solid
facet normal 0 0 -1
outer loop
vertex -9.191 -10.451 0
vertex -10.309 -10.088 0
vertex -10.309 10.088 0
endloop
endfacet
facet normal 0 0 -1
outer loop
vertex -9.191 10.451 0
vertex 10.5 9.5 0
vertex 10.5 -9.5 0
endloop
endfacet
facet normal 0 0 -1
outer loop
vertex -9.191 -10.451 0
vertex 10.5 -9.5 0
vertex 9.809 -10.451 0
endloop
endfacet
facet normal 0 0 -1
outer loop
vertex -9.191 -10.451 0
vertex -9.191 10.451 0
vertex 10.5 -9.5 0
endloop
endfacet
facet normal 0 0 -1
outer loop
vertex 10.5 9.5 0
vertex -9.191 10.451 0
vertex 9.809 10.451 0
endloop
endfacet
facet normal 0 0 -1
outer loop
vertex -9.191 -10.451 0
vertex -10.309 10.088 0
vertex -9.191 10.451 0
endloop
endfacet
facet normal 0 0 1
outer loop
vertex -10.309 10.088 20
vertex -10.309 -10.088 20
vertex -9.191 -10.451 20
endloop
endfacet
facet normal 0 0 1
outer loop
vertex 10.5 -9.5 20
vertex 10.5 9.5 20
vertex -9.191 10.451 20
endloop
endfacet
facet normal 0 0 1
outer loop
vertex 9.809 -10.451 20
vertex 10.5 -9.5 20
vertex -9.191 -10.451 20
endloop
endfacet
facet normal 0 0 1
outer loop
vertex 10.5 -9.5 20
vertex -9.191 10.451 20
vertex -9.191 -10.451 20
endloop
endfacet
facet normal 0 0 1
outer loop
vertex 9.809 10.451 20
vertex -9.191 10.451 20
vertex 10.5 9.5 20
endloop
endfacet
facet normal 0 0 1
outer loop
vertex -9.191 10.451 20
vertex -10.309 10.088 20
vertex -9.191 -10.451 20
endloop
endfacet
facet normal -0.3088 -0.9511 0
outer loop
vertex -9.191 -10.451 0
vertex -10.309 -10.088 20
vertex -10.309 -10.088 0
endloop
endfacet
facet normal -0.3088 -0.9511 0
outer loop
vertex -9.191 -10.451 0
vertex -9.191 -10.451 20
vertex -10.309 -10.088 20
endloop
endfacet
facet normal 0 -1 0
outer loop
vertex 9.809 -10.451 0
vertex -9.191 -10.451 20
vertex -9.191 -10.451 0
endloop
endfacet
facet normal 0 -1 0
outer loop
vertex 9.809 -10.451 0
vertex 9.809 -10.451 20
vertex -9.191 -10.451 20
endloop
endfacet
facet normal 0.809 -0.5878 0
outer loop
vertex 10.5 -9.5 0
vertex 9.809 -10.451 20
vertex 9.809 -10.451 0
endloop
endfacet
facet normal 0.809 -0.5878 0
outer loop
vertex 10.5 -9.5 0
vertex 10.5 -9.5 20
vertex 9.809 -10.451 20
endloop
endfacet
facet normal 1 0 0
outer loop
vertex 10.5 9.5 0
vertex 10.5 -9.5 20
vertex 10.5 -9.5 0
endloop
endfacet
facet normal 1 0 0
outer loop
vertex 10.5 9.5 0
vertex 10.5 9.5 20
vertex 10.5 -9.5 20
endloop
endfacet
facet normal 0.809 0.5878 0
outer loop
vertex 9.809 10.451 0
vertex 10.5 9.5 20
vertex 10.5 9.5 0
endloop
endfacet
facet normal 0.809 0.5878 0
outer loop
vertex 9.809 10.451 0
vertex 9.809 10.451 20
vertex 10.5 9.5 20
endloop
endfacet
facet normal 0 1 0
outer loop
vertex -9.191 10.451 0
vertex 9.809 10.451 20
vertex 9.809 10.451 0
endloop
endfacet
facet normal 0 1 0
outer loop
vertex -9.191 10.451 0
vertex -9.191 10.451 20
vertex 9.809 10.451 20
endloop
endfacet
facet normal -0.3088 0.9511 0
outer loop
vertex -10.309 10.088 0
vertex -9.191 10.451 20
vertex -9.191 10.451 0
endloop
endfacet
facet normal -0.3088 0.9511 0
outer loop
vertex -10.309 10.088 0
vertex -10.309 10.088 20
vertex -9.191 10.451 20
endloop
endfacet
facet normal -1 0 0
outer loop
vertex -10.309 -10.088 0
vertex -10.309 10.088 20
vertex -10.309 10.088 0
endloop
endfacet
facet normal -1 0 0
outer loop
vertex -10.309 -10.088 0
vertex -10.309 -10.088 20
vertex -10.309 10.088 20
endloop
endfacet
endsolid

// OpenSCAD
roundedRect([20,20,20], 1);

module roundedRect(size, radius)
{
x = size[0];
y = size[1];
z = size[2];

linear_extrude(height=z)
hull()
{
    // place 4 circles in the corners, with the given radius
    translate([(-x/2)+(radius/2), (-y/2)+(radius/2), 0])
    circle(r=radius);

    translate([(x/2)-(radius/2), (-y/2)+(radius/2), 0])
    circle(r=radius);

    translate([(-x/2)+(radius/2), (y/2)-(radius/2), 0])
    circle(r=radius);

    translate([(x/2)-(radius/2), (y/2)-(radius/2), 0])
    circle(r=radius);
}
}
